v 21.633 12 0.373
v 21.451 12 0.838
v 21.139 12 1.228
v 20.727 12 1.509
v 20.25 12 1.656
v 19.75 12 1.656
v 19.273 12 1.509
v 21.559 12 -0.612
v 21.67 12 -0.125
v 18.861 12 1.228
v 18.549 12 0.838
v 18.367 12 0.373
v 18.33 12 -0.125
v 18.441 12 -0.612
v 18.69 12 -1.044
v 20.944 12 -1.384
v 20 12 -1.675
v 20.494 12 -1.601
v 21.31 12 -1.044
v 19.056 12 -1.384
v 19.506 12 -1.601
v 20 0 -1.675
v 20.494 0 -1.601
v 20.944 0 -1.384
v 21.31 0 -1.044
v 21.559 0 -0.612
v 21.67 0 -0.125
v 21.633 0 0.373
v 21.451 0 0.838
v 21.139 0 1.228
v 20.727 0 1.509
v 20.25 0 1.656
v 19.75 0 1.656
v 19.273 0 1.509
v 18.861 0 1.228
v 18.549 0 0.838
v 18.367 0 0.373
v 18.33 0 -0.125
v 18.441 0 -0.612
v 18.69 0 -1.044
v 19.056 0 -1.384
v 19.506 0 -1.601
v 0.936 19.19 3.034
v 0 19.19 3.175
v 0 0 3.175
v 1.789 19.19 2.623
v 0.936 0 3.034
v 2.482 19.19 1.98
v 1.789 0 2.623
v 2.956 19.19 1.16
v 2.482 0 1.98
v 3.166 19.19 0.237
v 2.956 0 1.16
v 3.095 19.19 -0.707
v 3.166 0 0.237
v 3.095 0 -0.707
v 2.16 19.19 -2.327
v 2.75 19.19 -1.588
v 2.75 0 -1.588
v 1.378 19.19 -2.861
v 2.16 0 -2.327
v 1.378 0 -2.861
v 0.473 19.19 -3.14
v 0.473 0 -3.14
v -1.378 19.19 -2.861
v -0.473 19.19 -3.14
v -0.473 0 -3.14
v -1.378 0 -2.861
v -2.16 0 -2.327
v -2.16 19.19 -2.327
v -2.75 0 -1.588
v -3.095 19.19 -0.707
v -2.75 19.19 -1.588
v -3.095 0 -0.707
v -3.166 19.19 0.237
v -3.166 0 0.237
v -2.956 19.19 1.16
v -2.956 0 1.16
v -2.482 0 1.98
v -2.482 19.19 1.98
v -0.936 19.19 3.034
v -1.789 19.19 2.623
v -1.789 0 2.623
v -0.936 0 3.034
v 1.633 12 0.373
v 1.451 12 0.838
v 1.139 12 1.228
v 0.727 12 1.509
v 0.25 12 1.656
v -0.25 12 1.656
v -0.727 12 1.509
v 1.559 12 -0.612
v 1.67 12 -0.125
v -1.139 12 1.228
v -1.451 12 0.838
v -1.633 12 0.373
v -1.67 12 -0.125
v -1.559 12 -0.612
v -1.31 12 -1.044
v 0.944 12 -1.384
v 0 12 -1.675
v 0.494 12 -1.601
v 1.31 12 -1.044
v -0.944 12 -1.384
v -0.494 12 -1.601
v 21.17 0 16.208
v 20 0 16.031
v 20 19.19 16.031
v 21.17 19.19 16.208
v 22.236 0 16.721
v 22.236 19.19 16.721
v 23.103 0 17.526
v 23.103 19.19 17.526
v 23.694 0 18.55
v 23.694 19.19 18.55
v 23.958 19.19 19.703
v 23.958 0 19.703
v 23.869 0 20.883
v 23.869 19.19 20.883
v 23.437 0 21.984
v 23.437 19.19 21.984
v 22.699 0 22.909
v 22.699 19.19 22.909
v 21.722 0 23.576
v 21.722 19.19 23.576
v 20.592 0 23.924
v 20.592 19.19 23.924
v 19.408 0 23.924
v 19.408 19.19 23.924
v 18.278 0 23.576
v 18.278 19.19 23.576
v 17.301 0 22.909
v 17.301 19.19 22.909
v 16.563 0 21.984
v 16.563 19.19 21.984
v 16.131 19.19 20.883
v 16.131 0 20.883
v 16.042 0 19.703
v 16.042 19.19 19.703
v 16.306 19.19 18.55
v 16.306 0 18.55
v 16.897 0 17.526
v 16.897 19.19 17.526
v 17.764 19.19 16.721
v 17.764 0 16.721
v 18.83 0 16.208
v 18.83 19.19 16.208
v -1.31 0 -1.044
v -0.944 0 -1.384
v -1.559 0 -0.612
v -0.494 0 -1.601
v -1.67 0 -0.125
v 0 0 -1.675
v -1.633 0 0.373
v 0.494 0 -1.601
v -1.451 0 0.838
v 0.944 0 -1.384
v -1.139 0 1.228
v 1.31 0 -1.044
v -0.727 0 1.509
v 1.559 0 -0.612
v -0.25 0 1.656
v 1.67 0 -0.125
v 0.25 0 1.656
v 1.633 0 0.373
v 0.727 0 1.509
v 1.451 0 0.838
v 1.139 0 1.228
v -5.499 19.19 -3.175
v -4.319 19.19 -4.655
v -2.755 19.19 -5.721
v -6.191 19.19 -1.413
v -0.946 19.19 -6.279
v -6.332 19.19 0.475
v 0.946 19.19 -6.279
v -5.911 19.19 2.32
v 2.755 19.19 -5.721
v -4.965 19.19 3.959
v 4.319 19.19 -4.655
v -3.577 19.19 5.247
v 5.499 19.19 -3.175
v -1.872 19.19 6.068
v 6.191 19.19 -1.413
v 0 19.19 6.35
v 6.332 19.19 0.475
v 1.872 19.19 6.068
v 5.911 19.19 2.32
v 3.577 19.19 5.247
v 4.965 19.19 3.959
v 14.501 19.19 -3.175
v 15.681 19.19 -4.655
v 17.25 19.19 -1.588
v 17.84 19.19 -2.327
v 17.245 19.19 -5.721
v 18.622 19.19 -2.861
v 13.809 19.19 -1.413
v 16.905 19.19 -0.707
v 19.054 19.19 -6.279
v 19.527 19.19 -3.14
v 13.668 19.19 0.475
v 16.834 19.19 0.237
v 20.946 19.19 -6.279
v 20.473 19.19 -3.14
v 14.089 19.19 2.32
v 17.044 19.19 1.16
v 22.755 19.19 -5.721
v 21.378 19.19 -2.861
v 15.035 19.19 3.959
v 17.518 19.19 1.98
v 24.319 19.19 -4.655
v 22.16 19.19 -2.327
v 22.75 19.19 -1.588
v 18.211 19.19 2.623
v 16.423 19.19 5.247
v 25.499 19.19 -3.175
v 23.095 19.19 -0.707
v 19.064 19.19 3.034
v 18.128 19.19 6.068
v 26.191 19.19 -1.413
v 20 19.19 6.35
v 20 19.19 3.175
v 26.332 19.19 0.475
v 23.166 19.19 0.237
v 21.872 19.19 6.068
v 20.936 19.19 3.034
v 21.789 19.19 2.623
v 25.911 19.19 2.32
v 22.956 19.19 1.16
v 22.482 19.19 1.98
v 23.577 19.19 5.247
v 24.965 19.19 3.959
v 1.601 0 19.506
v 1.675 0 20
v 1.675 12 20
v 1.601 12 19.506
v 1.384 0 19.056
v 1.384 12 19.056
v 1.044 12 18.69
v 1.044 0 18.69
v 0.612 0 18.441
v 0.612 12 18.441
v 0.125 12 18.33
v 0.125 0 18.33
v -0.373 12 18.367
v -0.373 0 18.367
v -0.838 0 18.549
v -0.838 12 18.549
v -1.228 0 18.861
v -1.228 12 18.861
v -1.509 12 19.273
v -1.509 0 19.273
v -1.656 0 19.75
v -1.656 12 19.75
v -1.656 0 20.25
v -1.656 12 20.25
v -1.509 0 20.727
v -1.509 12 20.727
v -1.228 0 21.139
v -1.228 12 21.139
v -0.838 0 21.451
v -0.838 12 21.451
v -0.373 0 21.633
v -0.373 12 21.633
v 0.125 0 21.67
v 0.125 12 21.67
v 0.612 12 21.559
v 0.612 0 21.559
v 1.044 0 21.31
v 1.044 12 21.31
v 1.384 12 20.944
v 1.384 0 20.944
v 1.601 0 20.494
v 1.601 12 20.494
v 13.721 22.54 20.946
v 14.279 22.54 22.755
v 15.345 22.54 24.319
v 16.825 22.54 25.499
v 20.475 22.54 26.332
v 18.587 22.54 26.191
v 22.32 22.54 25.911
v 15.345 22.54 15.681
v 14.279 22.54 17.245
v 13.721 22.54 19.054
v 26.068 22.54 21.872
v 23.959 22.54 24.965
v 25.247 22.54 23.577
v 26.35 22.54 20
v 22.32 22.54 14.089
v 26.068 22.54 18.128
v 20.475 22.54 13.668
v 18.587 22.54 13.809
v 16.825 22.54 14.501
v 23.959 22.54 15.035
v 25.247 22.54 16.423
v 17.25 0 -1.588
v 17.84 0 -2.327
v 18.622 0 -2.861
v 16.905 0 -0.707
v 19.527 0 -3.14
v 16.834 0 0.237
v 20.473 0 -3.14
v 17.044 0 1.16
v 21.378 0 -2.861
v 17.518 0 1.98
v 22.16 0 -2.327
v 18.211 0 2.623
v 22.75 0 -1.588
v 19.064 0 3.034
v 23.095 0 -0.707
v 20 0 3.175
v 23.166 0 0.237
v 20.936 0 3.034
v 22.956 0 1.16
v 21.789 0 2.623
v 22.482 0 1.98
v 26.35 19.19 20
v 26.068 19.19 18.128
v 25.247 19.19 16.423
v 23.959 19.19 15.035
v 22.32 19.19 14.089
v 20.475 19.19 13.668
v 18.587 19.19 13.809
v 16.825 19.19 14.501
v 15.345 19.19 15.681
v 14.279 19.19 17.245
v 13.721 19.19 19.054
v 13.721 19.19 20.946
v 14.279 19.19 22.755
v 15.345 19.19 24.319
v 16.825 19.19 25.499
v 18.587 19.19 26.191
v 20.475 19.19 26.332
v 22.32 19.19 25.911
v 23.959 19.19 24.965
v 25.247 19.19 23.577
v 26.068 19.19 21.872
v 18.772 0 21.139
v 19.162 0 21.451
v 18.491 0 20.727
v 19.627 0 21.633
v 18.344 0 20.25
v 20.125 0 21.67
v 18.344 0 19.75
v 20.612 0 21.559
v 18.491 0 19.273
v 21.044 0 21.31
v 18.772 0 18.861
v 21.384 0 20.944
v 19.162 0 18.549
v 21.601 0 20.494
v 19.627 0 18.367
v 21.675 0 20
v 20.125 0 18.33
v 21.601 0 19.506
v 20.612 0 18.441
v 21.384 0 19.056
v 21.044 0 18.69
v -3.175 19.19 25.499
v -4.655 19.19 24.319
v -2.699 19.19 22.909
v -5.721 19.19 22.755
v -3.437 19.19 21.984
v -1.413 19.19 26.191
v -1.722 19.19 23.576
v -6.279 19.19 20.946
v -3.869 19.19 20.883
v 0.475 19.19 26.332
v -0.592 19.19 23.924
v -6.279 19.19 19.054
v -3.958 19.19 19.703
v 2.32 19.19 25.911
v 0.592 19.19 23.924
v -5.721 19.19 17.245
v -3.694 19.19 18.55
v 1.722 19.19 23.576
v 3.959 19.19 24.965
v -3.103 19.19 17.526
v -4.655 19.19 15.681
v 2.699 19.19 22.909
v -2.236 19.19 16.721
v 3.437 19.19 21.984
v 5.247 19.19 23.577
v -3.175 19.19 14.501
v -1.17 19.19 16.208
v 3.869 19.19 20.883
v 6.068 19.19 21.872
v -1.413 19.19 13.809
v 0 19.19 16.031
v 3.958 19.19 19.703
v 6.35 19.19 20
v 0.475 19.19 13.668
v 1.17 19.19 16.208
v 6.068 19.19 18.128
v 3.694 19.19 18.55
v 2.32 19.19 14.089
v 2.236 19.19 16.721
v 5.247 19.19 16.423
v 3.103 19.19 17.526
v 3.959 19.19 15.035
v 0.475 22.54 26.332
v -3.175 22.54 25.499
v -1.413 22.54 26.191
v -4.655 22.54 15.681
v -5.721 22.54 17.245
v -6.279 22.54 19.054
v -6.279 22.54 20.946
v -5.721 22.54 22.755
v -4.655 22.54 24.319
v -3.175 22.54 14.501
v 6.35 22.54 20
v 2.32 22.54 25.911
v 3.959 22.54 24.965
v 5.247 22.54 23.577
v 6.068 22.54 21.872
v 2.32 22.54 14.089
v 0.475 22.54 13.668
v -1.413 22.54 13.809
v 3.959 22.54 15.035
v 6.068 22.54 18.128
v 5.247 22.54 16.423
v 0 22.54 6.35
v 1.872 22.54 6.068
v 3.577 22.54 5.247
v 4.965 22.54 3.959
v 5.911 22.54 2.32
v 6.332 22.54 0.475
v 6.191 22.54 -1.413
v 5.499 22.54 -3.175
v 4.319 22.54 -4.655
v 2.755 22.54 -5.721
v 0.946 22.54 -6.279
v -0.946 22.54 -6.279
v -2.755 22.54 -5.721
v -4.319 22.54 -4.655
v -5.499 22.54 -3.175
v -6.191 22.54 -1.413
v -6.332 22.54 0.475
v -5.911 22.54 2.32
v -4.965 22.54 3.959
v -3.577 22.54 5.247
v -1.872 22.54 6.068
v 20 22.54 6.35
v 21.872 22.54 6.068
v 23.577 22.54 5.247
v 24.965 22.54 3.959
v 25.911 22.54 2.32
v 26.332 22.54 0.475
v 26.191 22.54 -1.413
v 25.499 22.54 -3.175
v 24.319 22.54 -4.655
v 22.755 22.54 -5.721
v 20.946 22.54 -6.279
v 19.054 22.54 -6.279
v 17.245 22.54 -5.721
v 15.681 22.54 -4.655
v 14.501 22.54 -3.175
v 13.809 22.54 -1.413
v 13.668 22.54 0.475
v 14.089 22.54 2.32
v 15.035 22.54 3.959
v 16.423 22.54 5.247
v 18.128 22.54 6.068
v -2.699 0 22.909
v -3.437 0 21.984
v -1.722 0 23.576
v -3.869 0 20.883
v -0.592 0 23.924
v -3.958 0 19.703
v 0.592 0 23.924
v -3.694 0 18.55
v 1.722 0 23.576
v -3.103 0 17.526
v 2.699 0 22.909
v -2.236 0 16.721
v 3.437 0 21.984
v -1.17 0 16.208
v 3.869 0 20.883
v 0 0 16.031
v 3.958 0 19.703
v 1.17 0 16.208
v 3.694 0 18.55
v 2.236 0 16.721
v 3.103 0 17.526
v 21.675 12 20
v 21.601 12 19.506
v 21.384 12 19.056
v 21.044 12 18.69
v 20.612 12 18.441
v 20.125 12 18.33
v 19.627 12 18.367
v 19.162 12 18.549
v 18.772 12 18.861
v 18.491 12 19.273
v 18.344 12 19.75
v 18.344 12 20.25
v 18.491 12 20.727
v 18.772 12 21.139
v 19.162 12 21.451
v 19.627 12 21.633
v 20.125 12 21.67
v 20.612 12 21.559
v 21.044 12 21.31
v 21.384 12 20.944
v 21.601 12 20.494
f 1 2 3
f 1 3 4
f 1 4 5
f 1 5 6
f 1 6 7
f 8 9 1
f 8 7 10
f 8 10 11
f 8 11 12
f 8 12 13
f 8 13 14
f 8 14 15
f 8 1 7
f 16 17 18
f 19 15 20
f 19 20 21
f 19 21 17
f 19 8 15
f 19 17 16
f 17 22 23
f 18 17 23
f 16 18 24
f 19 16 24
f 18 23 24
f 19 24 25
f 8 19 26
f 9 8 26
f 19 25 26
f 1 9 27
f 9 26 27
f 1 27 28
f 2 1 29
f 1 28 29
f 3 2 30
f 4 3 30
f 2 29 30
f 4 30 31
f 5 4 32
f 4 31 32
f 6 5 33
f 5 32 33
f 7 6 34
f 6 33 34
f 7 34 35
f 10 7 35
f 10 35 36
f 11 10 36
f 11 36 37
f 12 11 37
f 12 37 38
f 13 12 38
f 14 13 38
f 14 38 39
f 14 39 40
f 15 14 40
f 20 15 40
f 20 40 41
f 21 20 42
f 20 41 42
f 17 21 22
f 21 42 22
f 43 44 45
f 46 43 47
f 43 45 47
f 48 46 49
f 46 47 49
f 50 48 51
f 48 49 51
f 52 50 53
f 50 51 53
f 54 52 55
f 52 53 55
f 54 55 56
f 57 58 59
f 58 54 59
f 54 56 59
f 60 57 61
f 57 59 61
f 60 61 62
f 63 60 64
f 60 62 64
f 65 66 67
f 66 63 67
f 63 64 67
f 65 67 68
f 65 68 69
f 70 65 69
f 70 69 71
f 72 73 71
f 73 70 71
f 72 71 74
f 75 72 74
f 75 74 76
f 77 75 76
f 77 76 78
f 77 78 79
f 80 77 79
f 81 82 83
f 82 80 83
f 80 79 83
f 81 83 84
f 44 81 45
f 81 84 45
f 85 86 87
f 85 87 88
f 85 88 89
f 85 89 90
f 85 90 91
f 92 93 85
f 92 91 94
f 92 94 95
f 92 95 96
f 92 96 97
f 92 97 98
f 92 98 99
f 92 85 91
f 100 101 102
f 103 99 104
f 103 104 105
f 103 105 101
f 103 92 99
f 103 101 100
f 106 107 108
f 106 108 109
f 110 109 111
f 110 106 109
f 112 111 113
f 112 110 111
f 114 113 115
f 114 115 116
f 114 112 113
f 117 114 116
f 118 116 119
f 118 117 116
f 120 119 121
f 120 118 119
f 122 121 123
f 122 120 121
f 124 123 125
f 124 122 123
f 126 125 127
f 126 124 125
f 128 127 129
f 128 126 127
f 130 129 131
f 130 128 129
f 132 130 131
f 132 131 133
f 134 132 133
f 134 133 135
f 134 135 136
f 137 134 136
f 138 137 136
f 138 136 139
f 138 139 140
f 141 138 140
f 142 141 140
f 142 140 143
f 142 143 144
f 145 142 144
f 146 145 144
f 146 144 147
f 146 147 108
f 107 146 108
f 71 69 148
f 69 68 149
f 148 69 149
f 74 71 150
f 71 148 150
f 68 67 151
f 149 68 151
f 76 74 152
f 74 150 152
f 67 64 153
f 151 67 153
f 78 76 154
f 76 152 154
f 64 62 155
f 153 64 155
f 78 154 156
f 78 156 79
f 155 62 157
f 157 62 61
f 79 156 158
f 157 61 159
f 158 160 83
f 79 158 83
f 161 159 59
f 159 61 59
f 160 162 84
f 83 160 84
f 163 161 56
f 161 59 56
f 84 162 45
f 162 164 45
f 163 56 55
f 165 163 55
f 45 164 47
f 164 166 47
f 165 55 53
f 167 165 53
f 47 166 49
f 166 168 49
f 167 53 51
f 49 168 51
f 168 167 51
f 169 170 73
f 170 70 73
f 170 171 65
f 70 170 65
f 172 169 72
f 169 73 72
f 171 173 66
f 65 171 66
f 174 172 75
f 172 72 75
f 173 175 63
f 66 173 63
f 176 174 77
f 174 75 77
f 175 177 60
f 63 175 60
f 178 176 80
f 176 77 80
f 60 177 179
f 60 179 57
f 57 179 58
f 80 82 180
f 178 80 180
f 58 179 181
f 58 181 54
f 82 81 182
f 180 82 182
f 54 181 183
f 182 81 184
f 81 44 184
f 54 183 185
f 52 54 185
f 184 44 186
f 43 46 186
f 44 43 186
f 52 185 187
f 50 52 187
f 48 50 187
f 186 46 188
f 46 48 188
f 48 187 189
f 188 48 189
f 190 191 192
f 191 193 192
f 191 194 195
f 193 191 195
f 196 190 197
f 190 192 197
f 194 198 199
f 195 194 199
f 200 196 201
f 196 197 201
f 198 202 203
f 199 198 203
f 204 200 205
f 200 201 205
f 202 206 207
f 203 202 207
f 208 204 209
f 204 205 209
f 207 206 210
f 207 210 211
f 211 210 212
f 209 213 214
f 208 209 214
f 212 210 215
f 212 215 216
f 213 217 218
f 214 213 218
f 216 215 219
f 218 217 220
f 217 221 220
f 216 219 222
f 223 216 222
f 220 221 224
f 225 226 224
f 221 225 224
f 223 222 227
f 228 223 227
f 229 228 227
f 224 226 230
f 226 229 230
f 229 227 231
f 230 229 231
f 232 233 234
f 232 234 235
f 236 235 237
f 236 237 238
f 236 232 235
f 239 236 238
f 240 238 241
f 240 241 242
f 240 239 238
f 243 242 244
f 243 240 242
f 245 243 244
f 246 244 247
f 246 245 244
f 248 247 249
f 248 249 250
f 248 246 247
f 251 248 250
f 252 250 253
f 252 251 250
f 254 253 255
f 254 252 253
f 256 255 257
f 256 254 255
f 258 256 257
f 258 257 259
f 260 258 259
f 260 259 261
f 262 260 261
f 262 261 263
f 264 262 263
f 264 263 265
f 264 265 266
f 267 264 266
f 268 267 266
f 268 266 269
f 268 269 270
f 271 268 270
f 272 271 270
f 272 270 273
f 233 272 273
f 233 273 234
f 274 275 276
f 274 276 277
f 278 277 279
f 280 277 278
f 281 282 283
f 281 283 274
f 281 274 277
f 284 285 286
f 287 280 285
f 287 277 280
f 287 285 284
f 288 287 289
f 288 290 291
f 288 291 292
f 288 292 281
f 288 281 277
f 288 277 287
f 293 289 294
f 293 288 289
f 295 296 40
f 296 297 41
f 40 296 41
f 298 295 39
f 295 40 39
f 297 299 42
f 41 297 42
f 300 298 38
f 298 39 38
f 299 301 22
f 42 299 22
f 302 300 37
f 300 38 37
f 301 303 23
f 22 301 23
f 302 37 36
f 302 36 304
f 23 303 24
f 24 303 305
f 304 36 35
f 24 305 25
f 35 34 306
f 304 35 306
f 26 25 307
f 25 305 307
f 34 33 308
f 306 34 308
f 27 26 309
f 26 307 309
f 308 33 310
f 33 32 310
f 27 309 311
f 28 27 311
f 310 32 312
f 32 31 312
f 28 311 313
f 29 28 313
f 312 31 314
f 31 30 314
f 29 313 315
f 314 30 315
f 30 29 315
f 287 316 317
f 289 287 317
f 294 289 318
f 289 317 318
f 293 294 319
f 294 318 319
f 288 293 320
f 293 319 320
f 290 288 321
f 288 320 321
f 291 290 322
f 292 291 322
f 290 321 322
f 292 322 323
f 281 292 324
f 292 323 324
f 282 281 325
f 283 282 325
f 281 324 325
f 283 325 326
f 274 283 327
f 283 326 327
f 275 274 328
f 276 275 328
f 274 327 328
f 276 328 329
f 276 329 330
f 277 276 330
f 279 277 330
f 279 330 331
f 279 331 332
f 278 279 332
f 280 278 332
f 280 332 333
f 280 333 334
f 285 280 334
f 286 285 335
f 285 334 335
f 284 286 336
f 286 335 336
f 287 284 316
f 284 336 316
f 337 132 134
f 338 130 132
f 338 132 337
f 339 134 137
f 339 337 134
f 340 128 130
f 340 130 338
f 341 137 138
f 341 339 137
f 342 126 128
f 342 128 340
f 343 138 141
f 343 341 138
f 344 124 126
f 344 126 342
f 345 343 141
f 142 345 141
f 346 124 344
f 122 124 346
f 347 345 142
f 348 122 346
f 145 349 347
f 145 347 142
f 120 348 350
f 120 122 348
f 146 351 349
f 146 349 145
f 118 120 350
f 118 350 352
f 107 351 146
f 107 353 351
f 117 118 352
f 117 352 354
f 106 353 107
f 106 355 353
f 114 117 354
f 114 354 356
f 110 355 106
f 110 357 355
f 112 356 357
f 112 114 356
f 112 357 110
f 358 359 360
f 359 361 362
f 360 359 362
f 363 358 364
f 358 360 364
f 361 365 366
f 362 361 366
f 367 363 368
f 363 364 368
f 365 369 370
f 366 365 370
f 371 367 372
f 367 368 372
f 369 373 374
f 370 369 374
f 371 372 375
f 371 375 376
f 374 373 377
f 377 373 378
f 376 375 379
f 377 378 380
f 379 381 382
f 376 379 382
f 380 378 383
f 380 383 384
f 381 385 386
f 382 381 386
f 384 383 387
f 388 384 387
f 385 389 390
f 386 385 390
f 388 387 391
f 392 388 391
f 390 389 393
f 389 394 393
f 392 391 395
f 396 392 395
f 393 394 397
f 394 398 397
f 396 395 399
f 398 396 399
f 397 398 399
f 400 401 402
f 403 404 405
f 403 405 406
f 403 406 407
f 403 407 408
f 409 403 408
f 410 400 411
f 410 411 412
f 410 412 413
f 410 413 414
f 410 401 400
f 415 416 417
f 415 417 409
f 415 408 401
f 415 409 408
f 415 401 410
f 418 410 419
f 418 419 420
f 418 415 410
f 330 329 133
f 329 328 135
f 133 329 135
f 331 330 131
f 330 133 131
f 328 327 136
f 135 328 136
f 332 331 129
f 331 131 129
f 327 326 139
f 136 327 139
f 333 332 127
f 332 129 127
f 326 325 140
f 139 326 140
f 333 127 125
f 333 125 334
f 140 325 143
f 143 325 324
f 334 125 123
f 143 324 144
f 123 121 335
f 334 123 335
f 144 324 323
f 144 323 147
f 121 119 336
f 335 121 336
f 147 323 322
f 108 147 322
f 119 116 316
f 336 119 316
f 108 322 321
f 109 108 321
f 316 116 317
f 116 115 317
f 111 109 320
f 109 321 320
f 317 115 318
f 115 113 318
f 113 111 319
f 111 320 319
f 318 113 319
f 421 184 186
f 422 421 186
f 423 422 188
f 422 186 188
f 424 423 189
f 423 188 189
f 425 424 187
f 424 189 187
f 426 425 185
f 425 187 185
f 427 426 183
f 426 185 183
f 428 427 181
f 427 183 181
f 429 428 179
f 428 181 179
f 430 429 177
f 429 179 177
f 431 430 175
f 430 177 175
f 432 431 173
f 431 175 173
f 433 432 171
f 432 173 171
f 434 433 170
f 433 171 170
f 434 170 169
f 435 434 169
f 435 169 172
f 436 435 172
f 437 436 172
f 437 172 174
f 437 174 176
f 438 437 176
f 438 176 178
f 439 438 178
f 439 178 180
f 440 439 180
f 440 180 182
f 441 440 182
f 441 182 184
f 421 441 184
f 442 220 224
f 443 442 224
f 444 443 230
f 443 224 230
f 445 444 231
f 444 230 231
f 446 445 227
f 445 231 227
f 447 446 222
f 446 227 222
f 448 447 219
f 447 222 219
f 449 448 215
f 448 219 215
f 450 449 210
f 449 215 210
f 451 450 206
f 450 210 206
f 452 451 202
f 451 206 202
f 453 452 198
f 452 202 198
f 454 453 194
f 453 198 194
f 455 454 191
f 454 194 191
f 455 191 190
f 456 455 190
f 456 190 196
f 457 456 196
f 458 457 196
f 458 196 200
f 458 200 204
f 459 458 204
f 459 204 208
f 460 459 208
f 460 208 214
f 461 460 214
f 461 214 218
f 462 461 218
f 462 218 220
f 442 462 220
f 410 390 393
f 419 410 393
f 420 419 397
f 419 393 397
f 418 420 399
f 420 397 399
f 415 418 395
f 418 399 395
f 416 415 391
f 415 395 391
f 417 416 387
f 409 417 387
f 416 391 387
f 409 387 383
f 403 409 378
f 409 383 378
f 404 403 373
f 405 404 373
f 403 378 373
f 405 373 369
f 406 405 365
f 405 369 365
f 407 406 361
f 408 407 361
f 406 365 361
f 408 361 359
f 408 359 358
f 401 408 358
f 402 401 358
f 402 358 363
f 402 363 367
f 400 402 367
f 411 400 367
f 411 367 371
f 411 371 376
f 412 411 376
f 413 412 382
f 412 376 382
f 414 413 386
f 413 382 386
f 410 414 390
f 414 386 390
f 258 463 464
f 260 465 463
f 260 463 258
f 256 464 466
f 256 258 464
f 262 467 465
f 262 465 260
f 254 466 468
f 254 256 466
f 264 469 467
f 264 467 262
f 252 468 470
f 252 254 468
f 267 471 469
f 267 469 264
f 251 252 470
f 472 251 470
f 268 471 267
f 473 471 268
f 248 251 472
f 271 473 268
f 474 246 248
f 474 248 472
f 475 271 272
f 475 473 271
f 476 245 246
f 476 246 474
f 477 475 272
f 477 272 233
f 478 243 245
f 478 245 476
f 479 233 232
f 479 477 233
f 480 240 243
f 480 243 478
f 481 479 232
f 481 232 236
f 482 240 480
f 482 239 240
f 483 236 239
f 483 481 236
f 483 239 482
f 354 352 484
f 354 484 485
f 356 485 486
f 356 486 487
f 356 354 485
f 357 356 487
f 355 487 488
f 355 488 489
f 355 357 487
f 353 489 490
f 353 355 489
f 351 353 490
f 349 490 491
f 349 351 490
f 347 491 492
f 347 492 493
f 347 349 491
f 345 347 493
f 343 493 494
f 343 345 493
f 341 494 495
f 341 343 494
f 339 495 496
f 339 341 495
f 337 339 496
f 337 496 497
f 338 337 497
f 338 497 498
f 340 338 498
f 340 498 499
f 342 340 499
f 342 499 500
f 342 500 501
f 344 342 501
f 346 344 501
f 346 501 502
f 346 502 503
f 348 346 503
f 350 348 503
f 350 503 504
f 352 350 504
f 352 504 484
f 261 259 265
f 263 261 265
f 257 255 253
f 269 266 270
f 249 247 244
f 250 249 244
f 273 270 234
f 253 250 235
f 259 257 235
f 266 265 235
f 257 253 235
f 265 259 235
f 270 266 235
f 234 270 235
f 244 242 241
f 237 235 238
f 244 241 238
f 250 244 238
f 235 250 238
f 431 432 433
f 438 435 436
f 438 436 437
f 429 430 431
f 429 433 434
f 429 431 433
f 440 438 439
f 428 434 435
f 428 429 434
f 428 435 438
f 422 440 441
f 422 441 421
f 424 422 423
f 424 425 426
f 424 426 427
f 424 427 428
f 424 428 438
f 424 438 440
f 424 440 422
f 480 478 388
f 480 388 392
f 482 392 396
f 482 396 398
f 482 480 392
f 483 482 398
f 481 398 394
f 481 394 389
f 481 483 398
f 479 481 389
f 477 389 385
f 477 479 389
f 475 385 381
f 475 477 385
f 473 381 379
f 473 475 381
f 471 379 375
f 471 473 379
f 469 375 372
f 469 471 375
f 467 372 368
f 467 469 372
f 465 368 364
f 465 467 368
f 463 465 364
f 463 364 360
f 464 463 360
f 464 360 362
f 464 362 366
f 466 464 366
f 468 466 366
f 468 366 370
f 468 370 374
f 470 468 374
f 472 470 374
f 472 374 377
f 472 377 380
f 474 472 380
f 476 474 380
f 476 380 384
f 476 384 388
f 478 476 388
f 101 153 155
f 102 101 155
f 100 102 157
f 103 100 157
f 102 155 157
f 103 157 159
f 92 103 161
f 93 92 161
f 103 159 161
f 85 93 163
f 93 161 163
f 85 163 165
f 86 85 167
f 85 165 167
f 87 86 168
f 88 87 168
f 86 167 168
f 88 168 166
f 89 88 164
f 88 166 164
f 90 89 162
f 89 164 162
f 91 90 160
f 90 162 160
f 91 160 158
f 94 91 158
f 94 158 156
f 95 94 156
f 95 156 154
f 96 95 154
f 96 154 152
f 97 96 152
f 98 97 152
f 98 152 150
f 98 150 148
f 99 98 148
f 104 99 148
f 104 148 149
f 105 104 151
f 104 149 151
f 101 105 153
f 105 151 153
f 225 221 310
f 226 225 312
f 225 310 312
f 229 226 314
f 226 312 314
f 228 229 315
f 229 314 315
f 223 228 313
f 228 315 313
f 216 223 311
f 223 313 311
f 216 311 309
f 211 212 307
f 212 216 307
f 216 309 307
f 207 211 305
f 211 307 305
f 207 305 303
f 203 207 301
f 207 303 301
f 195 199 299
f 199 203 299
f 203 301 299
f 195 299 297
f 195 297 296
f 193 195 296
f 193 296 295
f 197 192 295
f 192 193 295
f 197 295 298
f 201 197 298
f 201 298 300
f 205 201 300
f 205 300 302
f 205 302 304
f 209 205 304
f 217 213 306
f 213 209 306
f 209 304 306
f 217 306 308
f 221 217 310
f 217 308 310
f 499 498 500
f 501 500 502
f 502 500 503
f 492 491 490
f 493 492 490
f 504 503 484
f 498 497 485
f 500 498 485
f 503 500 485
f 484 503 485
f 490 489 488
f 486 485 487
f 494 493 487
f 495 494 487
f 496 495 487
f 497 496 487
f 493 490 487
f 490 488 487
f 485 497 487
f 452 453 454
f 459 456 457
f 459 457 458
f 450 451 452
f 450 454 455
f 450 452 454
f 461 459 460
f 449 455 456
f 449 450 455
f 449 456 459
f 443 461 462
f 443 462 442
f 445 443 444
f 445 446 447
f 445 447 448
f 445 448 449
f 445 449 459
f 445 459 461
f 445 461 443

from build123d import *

# Parameters (mm, degrees)
SKETCH1_R                     = 3.175
BOSS_EXTRUDE1_DEPTH           = 20
SKETCH2_R                     = 1.675
CUT_EXTRUDE1_DEPTH            = 12
SKETCH4_R                     = 6.35
BOSS_EXTRUDE2_DEPTH           = 2.54
BOSS_EXTRUDE3_START           = -3.35
SKETCH6_R                     = 6.35
BOSS_EXTRUDE3_DEPTH           = 3.35
BODY_MOVE_COPY2_OUTLINE_R     = 3.175
BODY_MOVE_COPY2_OUTLINE_R_2   = 1.675
BODY_MOVE_COPY2_DEPTH         = 22.54
BODY_MOVE_COPY2_START         = 19.19
BODY_MOVE_COPY2_2_OUTLINE_R   = 6.35
BODY_MOVE_COPY2_2_OUTLINE_R_2 = 3.175
BODY_MOVE_COPY2_2_OUTLINE_R_3 = 1.675
BODY_MOVE_COPY2_2_DEPTH       = 3.35
BODY_MOVE_COPY2_START_2       = 12
BODY_MOVE_COPY2_3_OUTLINE_R   = 1.675
BODY_MOVE_COPY2_3_DEPTH       = 7.19
BOSS_EXTRUDE4_REACH           = 45.551
SKETCH8_R                     = 3.96875
SKETCH8_R_2                   = 1.675


# Read off the part's stored shape, not the designer's step: Body-Move/Copy2
with BuildPart() as part:
    # Sketch1 → Boss-Extrude1 (new body)
    with BuildSketch(Plane(origin=(0, 0, 0), x_dir=(1, 0, 0), z_dir=(0, 1, 0))):
        with Locations(Location((0, 0, 0), (0, 0, 270))):
            Circle(SKETCH1_R)
    extrude(amount=BOSS_EXTRUDE1_DEPTH)

    # Sketch2 → Cut-Extrude1 (cut)
    with BuildSketch(Plane.XZ):
        with Locations(Location((0, 0, 0), (0, 0, 270))):
            Circle(SKETCH2_R)
    extrude(amount=-CUT_EXTRUDE1_DEPTH, mode=Mode.SUBTRACT)

    # Sketch4 → Boss-Extrude2 (add)
    with BuildSketch(Plane(origin=(0, 20, 0), x_dir=(1, 0, 0), z_dir=(0, 1, 0))):
        with Locations(Location((0, 0, 0), (0, 0, 270))):
            Circle(SKETCH4_R)
    extrude(amount=BOSS_EXTRUDE2_DEPTH)

    # Sketch6 → Boss-Extrude3 (add)
    with BuildSketch(Plane(origin=(0, 22.54, 0), x_dir=(1, 0, 0), z_dir=(0, 1, 0)).offset(BOSS_EXTRUDE3_START)):
        with Locations(Location((0, 0, 0), (0, 0, 270))):
            Circle(SKETCH6_R)
    extrude(amount=BOSS_EXTRUDE3_DEPTH)


with BuildPart() as body_2:
    # Body-Move/Copy1: copy of part
    add(part.part.moved(Location((20, 0, 0))))


with BuildPart() as body_3:
    # Body-Move/Copy2 outline → Body-Move/Copy2 (new body)
    # profile 1 of 2: a face of its own
    with BuildSketch(Plane(origin=(0, 0, 0), x_dir=(1, 0, 0), z_dir=(0, 1, 0))):
        with Locations((20, -20)):
            Circle(BODY_MOVE_COPY2_OUTLINE_R)
        with Locations((20, -20)):
            Circle(BODY_MOVE_COPY2_OUTLINE_R_2, mode=Mode.SUBTRACT)
    # profile 2 of 2: a face of its own
    with BuildSketch(Plane(origin=(0, 0, 0), x_dir=(1, 0, 0), z_dir=(0, 1, 0))):
        with Locations((0, -20)):
            Circle(BODY_MOVE_COPY2_OUTLINE_R)
        with Locations((0, -20)):
            Circle(BODY_MOVE_COPY2_OUTLINE_R_2, mode=Mode.SUBTRACT)
    extrude(amount=BODY_MOVE_COPY2_DEPTH)



with BuildPart() as body_4:
    # Body-Move_Copy2 2 outline → Body-Move_Copy2 2 (new body)
    # profile 1 of 4: a face of its own
    with BuildSketch(Plane(origin=(0, 0, 0), x_dir=(1, 0, 0), z_dir=(0, 1, 0)).offset(BODY_MOVE_COPY2_START)):
        with Locations((20, -20)):
            Circle(BODY_MOVE_COPY2_2_OUTLINE_R)
        with Locations((20, -20)):
            Circle(BODY_MOVE_COPY2_2_OUTLINE_R_2, mode=Mode.SUBTRACT)
    # profile 2 of 4: a face of its own
    with BuildSketch(Plane(origin=(0, 0, 0), x_dir=(1, 0, 0), z_dir=(0, 1, 0)).offset(BODY_MOVE_COPY2_START)):
        with Locations((20, -20)):
            Circle(BODY_MOVE_COPY2_2_OUTLINE_R_3)
    # profile 3 of 4: a face of its own
    with BuildSketch(Plane(origin=(0, 0, 0), x_dir=(1, 0, 0), z_dir=(0, 1, 0)).offset(BODY_MOVE_COPY2_START)):
        with Locations((0, -20)):
            Circle(BODY_MOVE_COPY2_2_OUTLINE_R)
        with Locations((0, -20)):
            Circle(BODY_MOVE_COPY2_2_OUTLINE_R_2, mode=Mode.SUBTRACT)
    # profile 4 of 4: a face of its own
    with BuildSketch(Plane(origin=(0, 0, 0), x_dir=(1, 0, 0), z_dir=(0, 1, 0)).offset(BODY_MOVE_COPY2_START)):
        with Locations((0, -20)):
            Circle(BODY_MOVE_COPY2_2_OUTLINE_R_3)
    extrude(amount=BODY_MOVE_COPY2_2_DEPTH)


with BuildPart() as body_3_1:
    add(body_3.part)

    add(body_4.part)  # Body-Move_Copy2 3 merges body 4
    # Body-Move_Copy2 3 outline → Body-Move_Copy2 3 (add)
    with BuildSketch(Plane(origin=(0, 0, 0), x_dir=(1, 0, 0), z_dir=(0, 1, 0)).offset(BODY_MOVE_COPY2_START_2)):
        with Locations((20, -20)):
            Circle(BODY_MOVE_COPY2_3_OUTLINE_R)
        with Locations((0, -20)):
            Circle(BODY_MOVE_COPY2_3_OUTLINE_R)
    extrude(amount=BODY_MOVE_COPY2_3_DEPTH)

    # Sketch8 → Boss-Extrude4 (add, up to next)
    with BuildSketch(Plane.XZ, mode=Mode.PRIVATE) as boss_extrude4_sk1:
        with Locations(Location((0, 20, 0), (0, 0, 270))):
            Circle(SKETCH8_R)
        with Locations(Location((0, 20, 0), (0, 0, 270))):
            Circle(SKETCH8_R_2, mode=Mode.SUBTRACT)
    boss_extrude4_tool1 = extrude(boss_extrude4_sk1.sketch, amount=-BOSS_EXTRUDE4_REACH, mode=Mode.PRIVATE) - body_3_1.part
    # Sketch8 → Boss-Extrude4 (add, up to next)
    with BuildSketch(Plane.XZ, mode=Mode.PRIVATE) as boss_extrude4_sk2:
        with Locations(Location((20, 20, 0), (0, 0, 270))):
            Circle(SKETCH8_R)
        with Locations(Location((20, 20, 0), (0, 0, 270))):
            Circle(SKETCH8_R_2, mode=Mode.SUBTRACT)
    boss_extrude4_tool2 = extrude(boss_extrude4_sk2.sketch, amount=-BOSS_EXTRUDE4_REACH, mode=Mode.PRIVATE) - body_3_1.part
    add(boss_extrude4_tool1.solids().sort_by_distance((0, 0, 23.856497))[0])
    add(boss_extrude4_tool2.solids().sort_by_distance((20, 0, 23.856497))[0])


solid = Compound([part.part, body_2.part, body_3_1.part])
